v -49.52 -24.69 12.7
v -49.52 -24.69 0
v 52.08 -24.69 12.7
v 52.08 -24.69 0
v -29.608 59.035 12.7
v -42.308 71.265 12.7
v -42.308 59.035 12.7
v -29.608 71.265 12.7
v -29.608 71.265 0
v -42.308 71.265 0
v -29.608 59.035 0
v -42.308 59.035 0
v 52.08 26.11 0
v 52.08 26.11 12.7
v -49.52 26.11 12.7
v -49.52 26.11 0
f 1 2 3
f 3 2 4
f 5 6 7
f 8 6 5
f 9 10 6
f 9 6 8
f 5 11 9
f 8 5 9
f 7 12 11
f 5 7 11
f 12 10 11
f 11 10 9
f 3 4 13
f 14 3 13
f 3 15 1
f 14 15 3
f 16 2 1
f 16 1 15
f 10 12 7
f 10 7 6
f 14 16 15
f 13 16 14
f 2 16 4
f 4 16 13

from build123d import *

# Parameters (mm, degrees)
F0_W     = 101.6
F0_H     = 50.8
F1_DEPTH = 12.7
F2_DEPTH = 12.7
F0_W_2   = 12.7
F0_H_2   = 12.2296307023
F0_H_3   = 12.7


with BuildPart() as f1:
    # F0 (on Top) → F1 (new body)
    with BuildSketch(Plane.XY):
        with Locations((1.2797895743, 0.7095372477)):
            Rectangle(F0_W, F0_H)
    extrude(amount=F1_DEPTH)

    # F0 (on Top) → F2 (join)
    with BuildSketch(Plane.XY):
        with Locations((1.2797895743, 0.7095372477)):
            Rectangle(F0_W, F0_H)
    extrude(amount=F2_DEPTH)


with BuildPart() as f2:
    # F0 (on Top) → F2, piece 2 (new body)
    with BuildSketch(Plane.XY):
        with Locations((-35.9578634432, 65.1502772444)):
            Rectangle(F0_W_2, F0_H_2)
    extrude(amount=F2_DEPTH)


with BuildPart() as f2b:
    # F0 (on Top) → F2, piece 3 (new body)
    with BuildSketch(Plane.XY):
        with Locations((-3.0319387976, 58.800275843)):
            Rectangle(F0_W_2, F0_H_3)
    extrude(amount=F2_DEPTH)


solid = Compound([f1.part, f2.part])
